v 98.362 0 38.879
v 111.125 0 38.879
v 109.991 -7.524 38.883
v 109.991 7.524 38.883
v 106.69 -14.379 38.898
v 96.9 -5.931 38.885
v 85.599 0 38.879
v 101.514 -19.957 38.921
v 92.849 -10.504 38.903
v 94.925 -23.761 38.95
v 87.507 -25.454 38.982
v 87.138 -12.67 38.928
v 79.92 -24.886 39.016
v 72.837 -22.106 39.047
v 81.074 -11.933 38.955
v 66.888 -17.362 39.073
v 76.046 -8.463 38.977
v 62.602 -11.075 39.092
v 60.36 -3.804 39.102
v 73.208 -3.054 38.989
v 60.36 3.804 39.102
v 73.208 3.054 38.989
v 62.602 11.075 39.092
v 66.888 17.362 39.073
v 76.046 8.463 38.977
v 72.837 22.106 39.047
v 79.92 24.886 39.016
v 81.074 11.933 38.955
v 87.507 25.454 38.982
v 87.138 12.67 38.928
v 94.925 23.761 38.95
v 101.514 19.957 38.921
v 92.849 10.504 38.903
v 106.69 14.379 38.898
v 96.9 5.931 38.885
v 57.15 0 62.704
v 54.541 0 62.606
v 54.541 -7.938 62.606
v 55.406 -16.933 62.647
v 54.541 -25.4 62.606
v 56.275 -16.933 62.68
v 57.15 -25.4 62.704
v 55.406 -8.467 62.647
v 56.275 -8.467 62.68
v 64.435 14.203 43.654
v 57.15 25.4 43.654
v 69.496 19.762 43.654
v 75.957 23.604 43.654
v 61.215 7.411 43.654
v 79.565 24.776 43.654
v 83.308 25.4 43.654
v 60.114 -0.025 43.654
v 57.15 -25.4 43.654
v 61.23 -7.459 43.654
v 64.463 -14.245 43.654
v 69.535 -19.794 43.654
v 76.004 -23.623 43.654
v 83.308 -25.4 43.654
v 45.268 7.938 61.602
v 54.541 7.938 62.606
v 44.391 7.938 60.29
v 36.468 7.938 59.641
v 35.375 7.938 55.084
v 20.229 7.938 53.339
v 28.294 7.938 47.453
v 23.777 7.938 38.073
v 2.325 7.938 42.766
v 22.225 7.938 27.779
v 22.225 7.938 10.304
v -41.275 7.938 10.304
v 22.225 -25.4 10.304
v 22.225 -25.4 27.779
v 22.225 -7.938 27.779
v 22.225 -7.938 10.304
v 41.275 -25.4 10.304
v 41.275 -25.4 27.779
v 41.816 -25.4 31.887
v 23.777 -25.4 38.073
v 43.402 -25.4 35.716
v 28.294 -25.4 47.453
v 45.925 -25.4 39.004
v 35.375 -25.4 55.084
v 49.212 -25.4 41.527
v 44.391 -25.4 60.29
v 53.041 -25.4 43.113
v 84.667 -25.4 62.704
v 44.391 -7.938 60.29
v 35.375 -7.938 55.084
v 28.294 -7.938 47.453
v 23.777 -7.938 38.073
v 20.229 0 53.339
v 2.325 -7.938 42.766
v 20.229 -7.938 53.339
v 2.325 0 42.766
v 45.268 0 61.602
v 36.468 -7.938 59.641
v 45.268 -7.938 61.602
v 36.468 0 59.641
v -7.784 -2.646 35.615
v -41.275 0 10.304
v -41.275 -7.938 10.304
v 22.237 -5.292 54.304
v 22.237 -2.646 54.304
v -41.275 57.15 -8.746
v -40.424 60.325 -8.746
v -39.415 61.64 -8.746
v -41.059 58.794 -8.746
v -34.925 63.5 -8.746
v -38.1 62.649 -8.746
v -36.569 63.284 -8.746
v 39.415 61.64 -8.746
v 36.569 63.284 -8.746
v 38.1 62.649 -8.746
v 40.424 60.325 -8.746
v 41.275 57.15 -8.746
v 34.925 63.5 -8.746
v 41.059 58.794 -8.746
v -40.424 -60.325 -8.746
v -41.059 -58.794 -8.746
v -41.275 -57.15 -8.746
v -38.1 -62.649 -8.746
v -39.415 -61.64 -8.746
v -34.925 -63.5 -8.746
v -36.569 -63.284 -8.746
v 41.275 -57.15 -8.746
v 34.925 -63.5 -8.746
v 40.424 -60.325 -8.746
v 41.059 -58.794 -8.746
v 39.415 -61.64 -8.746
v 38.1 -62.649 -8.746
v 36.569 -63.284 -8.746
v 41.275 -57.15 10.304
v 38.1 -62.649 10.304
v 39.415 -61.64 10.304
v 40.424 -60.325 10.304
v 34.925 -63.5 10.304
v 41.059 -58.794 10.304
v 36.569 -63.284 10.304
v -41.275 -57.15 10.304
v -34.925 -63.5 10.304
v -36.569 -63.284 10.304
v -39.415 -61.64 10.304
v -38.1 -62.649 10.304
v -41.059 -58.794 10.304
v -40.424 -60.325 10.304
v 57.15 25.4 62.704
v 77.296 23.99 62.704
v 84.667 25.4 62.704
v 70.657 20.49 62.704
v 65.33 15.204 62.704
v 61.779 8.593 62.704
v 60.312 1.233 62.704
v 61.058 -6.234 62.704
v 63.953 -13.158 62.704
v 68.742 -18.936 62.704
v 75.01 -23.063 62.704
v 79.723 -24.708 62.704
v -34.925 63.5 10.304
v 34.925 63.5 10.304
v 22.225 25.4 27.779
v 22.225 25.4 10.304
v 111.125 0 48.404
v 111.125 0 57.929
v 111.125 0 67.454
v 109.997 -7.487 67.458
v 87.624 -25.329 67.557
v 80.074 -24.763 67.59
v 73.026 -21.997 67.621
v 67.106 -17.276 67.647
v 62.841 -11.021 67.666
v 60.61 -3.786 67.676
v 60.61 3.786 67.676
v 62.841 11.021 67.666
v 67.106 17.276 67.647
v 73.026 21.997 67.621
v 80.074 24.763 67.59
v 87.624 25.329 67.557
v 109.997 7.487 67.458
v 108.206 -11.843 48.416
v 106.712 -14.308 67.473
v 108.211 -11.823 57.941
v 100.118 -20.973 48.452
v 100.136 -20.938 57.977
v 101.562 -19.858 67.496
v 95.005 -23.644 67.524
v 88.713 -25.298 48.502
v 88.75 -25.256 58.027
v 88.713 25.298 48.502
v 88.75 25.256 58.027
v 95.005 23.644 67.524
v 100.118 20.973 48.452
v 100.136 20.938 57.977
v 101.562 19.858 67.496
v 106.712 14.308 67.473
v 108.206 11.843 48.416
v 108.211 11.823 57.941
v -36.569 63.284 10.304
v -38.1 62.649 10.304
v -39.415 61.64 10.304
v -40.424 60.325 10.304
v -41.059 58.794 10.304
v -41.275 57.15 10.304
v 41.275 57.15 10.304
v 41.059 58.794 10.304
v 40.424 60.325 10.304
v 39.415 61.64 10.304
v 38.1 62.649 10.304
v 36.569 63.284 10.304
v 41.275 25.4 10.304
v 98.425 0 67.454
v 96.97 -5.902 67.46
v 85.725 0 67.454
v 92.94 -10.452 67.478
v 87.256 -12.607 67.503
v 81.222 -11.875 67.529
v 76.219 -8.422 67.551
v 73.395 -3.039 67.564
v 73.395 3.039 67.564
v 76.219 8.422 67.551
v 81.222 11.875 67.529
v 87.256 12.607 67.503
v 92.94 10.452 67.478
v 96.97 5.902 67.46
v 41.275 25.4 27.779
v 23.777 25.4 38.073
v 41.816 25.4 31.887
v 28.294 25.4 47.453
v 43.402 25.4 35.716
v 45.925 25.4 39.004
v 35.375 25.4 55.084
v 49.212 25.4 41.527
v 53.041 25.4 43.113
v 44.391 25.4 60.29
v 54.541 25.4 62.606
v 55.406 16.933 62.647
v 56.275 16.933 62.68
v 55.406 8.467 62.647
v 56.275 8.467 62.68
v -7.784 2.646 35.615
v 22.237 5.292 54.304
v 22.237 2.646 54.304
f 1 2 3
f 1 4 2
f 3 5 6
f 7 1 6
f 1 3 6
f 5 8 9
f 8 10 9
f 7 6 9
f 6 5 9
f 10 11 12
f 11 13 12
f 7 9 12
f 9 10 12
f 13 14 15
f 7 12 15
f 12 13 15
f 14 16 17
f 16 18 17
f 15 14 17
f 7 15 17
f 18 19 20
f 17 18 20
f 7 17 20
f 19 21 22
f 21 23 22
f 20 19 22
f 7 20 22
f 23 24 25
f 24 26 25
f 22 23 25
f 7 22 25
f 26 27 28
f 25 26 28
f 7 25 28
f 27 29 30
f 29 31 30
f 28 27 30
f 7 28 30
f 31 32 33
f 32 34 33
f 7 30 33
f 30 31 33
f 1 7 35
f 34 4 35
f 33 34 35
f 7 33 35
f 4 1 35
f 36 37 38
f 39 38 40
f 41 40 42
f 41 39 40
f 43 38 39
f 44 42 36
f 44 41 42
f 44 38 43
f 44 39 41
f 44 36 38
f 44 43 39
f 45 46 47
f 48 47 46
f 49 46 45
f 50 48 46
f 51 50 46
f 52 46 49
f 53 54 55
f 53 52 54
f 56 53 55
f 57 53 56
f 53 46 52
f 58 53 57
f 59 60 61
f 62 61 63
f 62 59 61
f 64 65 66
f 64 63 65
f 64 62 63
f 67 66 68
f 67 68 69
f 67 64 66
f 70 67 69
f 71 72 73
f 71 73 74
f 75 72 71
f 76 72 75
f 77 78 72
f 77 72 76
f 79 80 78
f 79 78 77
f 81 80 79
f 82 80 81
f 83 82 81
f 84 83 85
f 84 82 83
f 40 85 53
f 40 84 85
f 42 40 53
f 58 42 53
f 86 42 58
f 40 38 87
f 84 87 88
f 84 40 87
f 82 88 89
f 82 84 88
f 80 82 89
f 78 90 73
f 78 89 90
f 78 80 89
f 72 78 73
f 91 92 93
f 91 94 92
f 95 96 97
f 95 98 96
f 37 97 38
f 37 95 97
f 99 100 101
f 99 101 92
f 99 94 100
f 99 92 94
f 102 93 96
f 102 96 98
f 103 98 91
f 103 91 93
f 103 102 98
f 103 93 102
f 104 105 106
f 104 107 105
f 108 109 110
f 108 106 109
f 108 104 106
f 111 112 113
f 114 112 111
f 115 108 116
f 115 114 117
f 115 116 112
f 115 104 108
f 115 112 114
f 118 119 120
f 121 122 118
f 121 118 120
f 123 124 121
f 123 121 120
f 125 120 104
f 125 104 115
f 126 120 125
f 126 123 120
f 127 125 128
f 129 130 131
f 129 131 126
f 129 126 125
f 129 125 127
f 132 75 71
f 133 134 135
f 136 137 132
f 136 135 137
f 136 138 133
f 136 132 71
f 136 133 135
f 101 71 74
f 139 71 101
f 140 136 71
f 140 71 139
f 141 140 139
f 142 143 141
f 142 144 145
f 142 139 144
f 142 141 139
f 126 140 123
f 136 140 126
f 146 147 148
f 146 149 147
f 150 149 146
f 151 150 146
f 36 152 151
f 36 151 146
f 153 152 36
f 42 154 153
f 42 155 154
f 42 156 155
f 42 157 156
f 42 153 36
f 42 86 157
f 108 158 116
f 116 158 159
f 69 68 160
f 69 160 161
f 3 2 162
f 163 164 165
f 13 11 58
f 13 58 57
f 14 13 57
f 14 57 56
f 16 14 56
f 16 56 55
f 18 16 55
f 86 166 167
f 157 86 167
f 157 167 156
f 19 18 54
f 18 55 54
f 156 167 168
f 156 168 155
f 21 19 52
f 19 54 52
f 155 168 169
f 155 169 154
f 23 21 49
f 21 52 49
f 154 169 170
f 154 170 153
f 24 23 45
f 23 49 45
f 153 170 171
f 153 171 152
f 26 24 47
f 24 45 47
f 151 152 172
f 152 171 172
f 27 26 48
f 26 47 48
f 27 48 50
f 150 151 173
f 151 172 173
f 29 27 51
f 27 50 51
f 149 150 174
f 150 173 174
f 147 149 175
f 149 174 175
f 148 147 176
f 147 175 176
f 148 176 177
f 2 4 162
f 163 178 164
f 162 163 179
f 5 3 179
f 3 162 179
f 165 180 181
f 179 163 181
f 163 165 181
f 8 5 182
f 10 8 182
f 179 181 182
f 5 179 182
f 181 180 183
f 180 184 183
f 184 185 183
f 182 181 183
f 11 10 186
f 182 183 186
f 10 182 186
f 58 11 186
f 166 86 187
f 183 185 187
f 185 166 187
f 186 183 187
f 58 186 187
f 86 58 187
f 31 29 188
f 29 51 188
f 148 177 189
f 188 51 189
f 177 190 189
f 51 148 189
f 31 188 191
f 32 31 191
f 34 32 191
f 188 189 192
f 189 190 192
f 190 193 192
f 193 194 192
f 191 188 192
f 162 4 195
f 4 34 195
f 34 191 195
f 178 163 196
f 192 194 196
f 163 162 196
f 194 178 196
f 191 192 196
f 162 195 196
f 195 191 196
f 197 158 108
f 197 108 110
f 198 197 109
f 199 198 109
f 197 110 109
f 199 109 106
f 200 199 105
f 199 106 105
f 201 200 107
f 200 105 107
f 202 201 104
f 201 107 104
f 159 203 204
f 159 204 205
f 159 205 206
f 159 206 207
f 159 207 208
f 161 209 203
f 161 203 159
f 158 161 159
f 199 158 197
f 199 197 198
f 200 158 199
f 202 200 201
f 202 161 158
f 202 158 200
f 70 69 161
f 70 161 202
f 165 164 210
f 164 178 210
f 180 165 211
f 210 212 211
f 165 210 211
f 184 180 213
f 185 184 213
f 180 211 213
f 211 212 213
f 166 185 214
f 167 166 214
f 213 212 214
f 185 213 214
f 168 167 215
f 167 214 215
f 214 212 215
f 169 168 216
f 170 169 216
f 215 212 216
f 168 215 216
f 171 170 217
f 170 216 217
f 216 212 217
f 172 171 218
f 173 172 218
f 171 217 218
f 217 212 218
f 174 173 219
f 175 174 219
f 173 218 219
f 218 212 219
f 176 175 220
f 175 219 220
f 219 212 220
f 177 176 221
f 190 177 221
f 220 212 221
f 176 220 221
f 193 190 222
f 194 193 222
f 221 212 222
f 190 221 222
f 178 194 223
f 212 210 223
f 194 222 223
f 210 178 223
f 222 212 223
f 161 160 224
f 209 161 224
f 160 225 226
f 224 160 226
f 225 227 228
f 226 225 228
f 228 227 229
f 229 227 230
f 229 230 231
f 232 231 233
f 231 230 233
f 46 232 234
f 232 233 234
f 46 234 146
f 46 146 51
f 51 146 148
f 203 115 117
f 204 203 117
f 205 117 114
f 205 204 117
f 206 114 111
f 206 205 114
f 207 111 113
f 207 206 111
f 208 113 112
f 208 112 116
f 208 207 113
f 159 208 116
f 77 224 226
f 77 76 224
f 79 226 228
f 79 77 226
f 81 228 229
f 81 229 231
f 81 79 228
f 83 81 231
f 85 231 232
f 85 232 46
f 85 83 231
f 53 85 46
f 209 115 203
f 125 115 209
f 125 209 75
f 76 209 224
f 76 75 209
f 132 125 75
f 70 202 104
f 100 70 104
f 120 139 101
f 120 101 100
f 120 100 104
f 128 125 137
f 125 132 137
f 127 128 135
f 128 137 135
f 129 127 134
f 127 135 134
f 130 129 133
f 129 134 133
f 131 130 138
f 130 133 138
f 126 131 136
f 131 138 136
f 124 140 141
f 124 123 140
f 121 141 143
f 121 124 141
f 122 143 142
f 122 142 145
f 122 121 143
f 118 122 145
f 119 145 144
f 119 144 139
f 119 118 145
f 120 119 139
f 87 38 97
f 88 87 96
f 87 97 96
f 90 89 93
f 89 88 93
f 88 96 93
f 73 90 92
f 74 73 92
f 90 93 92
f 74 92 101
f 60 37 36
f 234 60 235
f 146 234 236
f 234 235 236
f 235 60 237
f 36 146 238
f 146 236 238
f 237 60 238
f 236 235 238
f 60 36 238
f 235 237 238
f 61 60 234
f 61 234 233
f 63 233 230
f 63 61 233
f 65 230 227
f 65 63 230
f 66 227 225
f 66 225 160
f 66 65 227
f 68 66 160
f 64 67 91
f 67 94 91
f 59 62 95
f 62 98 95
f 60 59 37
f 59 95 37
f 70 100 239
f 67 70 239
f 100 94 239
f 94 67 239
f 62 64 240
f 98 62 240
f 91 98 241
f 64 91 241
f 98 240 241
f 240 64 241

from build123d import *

# Parameters (mm, degrees)
F1_DEPTH = 63.5
F0_W     = 25.2742138386
F0_H     = 19.05
F2_DEPTH = 25.4
F3_DEPTH = 7.9375
F5_R     = 6.35


with BuildPart() as f1:
    # F0 (on Front) → F1 (new body, symmetric)
    with BuildSketch(Plane.XZ):
        Polygon((-41.275, 10.3035005007), (-41.275, -8.7464994993), (41.275, -8.7464994993), (41.275, 10.3035005007), (22.225, 10.3035005007), align=None)
    extrude(amount=F1_DEPTH, both=True)

    # F0 (on Front) → F2 (join, symmetric)
    with BuildSketch(Plane.XZ):
        with Locations((72.9621069193, 53.1787005007)):
            Rectangle(F0_W, F0_H)
        with BuildLine():
            Line((22.225, 10.3035005007), (41.275, 10.3035005007))
            Line((41.275, 10.3035005007), (41.275, 27.7787005007))
            ThreePointArc((41.275, 27.7787005007), (45.9246798487, 39.0040206521), (57.15, 43.6537005007))
            Line((57.15, 43.6537005007), (60.325, 43.6537005007))
            Line((60.325, 43.6537005007), (60.325, 62.7037005007))
            Line((60.325, 62.7037005007), (57.15, 62.7037005007))
            add(Edge.make_bspline(
                [(54.5407420492, 62.6060948613), (55.4032018072, 62.651337728), (56.2728292952, 62.6839548454), (57.15, 62.7037005007)],
                knots=[108.849692603, 108.849692603, 108.849692603, 108.849692603, 111.5045361635, 111.5045361635, 111.5045361635, 111.5045361635], degree=3))
            ThreePointArc((54.5407420492, 62.6060948613), (31.5483988886, 51.5339871867), (22.225, 27.7787005007))
            Line((22.225, 27.7787005007), (22.225, 10.3035005007))
        make_face()
    extrude(amount=F2_DEPTH, both=True)

    # F0 (on Front) → F3 (join, symmetric)
    with BuildSketch(Plane.XZ):
        with BuildLine():
            add(Edge.make_bspline(
                [(-41.275, 10.3035005007), (-4.1324779121, 37.6718258525), (19.1795324712, 60.7511184661), (54.5407420492, 62.6060948613)],
                knots=[0, 0, 0, 0, 108.849692603, 108.849692603, 108.849692603, 108.849692603], degree=3))
            Line((-41.275, 10.3035005007), (22.225, 10.3035005007))
            Line((22.225, 10.3035005007), (22.225, 27.7787005007))
            ThreePointArc((22.225, 27.7787005007), (31.5483988886, 51.5339871867), (54.5407420492, 62.6060948613))
        make_face()
    extrude(amount=F3_DEPTH, both=True)

    # F0 (on Front) → F4 (revolve)
    with BuildSketch(Plane.XZ):
        Polygon((111.125, 67.4535005007), (85.725, 67.4535005007), (85.5992138386, 38.8785005007), (111.125, 38.8785005007), align=None)
    revolve(axis=Axis((85.6621069193, 0, 53.1660005007), (-0.0044019228, 0, -0.9999903115)))

    # F5
    f5_edges = [f1.edges().sort_by_distance(p)[0] for p in [
        (41.275, 63.5, 0.778501),
        (-41.275, 63.5, 0.778501),
        (41.275, -63.5, 0.778501),
        (-41.275, -63.5, 0.778501),
    ]]
    fillet(f5_edges, radius=F5_R)


solid = f1.part
